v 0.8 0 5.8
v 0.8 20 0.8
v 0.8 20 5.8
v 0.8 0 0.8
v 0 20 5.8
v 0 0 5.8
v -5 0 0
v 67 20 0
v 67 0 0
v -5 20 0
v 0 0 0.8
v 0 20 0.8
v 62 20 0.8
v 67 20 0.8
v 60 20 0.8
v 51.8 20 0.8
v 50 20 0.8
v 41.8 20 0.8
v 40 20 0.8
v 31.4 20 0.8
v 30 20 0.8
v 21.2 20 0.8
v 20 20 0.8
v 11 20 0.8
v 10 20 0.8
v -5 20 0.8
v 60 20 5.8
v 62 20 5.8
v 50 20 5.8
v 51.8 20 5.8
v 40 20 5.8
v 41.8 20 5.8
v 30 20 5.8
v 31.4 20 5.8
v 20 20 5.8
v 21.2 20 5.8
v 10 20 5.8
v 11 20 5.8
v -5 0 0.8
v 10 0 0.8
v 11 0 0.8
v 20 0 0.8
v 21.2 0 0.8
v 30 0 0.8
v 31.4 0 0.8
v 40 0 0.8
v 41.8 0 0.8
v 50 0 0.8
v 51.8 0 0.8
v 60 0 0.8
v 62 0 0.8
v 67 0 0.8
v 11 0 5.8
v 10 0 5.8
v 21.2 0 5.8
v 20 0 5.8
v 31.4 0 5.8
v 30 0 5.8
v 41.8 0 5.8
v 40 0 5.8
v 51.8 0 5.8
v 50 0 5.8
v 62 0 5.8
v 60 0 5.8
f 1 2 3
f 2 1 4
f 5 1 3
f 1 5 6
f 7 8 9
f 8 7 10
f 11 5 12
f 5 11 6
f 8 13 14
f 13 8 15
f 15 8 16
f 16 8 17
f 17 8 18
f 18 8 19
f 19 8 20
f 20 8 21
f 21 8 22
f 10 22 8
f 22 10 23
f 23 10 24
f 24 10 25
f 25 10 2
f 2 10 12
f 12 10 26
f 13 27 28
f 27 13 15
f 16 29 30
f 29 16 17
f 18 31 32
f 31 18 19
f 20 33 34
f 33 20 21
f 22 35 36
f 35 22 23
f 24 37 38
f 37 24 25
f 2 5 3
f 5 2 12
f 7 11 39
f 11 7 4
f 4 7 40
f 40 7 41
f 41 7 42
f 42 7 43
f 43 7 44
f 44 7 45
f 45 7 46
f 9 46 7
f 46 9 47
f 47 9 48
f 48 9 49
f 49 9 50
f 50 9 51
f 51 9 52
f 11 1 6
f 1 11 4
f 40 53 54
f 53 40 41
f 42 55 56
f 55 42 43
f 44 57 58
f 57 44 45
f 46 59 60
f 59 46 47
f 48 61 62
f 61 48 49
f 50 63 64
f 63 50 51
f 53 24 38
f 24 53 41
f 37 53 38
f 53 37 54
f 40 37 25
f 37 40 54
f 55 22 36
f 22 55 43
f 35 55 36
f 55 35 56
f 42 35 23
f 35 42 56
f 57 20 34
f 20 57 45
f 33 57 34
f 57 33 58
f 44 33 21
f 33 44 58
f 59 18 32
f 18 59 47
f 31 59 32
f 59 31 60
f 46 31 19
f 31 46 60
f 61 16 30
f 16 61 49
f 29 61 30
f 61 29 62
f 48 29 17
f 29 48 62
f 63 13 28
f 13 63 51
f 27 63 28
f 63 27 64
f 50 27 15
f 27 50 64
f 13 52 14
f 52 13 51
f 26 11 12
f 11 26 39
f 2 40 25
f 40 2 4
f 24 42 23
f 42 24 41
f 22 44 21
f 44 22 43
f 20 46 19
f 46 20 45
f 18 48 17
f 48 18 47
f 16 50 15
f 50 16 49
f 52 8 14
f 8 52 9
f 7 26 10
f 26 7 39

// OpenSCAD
// Thin walls 3D printer test pattern.

/* [Global */

// List of wall widthes [mm].
wall_widthes = [0.8, 1.0, 1.2, 1.4, 1.8, 1.8, 2.0];

// Wall height above the base [mm].
wall_height = 5;

// Wall length [mm].
wall_length = 20;

// Wall spacing [mm].
wall_pitch = 10;

// Base height [mm].
base_height = 0.8;

module one_wall(i, w, h) {
  echo("wall:", i, w);
  x = i * wall_pitch;
  translate([x, 0, 0]) cube([w, wall_length, h]);
}

module all_walls(h) {
  for (i = [ 0 : len(wall_widthes) - 1 ]) {
    one_wall(i, wall_widthes[i], h); 
  }
}

module base() {
  hull() {
    translate([wall_pitch/2, 0, 0]) all_walls(base_height);
    translate([-wall_pitch/2, 0, 0]) all_walls(base_height);
  }
}

module main() {
  all_walls(base_height + wall_height);
  base();
}

main();
